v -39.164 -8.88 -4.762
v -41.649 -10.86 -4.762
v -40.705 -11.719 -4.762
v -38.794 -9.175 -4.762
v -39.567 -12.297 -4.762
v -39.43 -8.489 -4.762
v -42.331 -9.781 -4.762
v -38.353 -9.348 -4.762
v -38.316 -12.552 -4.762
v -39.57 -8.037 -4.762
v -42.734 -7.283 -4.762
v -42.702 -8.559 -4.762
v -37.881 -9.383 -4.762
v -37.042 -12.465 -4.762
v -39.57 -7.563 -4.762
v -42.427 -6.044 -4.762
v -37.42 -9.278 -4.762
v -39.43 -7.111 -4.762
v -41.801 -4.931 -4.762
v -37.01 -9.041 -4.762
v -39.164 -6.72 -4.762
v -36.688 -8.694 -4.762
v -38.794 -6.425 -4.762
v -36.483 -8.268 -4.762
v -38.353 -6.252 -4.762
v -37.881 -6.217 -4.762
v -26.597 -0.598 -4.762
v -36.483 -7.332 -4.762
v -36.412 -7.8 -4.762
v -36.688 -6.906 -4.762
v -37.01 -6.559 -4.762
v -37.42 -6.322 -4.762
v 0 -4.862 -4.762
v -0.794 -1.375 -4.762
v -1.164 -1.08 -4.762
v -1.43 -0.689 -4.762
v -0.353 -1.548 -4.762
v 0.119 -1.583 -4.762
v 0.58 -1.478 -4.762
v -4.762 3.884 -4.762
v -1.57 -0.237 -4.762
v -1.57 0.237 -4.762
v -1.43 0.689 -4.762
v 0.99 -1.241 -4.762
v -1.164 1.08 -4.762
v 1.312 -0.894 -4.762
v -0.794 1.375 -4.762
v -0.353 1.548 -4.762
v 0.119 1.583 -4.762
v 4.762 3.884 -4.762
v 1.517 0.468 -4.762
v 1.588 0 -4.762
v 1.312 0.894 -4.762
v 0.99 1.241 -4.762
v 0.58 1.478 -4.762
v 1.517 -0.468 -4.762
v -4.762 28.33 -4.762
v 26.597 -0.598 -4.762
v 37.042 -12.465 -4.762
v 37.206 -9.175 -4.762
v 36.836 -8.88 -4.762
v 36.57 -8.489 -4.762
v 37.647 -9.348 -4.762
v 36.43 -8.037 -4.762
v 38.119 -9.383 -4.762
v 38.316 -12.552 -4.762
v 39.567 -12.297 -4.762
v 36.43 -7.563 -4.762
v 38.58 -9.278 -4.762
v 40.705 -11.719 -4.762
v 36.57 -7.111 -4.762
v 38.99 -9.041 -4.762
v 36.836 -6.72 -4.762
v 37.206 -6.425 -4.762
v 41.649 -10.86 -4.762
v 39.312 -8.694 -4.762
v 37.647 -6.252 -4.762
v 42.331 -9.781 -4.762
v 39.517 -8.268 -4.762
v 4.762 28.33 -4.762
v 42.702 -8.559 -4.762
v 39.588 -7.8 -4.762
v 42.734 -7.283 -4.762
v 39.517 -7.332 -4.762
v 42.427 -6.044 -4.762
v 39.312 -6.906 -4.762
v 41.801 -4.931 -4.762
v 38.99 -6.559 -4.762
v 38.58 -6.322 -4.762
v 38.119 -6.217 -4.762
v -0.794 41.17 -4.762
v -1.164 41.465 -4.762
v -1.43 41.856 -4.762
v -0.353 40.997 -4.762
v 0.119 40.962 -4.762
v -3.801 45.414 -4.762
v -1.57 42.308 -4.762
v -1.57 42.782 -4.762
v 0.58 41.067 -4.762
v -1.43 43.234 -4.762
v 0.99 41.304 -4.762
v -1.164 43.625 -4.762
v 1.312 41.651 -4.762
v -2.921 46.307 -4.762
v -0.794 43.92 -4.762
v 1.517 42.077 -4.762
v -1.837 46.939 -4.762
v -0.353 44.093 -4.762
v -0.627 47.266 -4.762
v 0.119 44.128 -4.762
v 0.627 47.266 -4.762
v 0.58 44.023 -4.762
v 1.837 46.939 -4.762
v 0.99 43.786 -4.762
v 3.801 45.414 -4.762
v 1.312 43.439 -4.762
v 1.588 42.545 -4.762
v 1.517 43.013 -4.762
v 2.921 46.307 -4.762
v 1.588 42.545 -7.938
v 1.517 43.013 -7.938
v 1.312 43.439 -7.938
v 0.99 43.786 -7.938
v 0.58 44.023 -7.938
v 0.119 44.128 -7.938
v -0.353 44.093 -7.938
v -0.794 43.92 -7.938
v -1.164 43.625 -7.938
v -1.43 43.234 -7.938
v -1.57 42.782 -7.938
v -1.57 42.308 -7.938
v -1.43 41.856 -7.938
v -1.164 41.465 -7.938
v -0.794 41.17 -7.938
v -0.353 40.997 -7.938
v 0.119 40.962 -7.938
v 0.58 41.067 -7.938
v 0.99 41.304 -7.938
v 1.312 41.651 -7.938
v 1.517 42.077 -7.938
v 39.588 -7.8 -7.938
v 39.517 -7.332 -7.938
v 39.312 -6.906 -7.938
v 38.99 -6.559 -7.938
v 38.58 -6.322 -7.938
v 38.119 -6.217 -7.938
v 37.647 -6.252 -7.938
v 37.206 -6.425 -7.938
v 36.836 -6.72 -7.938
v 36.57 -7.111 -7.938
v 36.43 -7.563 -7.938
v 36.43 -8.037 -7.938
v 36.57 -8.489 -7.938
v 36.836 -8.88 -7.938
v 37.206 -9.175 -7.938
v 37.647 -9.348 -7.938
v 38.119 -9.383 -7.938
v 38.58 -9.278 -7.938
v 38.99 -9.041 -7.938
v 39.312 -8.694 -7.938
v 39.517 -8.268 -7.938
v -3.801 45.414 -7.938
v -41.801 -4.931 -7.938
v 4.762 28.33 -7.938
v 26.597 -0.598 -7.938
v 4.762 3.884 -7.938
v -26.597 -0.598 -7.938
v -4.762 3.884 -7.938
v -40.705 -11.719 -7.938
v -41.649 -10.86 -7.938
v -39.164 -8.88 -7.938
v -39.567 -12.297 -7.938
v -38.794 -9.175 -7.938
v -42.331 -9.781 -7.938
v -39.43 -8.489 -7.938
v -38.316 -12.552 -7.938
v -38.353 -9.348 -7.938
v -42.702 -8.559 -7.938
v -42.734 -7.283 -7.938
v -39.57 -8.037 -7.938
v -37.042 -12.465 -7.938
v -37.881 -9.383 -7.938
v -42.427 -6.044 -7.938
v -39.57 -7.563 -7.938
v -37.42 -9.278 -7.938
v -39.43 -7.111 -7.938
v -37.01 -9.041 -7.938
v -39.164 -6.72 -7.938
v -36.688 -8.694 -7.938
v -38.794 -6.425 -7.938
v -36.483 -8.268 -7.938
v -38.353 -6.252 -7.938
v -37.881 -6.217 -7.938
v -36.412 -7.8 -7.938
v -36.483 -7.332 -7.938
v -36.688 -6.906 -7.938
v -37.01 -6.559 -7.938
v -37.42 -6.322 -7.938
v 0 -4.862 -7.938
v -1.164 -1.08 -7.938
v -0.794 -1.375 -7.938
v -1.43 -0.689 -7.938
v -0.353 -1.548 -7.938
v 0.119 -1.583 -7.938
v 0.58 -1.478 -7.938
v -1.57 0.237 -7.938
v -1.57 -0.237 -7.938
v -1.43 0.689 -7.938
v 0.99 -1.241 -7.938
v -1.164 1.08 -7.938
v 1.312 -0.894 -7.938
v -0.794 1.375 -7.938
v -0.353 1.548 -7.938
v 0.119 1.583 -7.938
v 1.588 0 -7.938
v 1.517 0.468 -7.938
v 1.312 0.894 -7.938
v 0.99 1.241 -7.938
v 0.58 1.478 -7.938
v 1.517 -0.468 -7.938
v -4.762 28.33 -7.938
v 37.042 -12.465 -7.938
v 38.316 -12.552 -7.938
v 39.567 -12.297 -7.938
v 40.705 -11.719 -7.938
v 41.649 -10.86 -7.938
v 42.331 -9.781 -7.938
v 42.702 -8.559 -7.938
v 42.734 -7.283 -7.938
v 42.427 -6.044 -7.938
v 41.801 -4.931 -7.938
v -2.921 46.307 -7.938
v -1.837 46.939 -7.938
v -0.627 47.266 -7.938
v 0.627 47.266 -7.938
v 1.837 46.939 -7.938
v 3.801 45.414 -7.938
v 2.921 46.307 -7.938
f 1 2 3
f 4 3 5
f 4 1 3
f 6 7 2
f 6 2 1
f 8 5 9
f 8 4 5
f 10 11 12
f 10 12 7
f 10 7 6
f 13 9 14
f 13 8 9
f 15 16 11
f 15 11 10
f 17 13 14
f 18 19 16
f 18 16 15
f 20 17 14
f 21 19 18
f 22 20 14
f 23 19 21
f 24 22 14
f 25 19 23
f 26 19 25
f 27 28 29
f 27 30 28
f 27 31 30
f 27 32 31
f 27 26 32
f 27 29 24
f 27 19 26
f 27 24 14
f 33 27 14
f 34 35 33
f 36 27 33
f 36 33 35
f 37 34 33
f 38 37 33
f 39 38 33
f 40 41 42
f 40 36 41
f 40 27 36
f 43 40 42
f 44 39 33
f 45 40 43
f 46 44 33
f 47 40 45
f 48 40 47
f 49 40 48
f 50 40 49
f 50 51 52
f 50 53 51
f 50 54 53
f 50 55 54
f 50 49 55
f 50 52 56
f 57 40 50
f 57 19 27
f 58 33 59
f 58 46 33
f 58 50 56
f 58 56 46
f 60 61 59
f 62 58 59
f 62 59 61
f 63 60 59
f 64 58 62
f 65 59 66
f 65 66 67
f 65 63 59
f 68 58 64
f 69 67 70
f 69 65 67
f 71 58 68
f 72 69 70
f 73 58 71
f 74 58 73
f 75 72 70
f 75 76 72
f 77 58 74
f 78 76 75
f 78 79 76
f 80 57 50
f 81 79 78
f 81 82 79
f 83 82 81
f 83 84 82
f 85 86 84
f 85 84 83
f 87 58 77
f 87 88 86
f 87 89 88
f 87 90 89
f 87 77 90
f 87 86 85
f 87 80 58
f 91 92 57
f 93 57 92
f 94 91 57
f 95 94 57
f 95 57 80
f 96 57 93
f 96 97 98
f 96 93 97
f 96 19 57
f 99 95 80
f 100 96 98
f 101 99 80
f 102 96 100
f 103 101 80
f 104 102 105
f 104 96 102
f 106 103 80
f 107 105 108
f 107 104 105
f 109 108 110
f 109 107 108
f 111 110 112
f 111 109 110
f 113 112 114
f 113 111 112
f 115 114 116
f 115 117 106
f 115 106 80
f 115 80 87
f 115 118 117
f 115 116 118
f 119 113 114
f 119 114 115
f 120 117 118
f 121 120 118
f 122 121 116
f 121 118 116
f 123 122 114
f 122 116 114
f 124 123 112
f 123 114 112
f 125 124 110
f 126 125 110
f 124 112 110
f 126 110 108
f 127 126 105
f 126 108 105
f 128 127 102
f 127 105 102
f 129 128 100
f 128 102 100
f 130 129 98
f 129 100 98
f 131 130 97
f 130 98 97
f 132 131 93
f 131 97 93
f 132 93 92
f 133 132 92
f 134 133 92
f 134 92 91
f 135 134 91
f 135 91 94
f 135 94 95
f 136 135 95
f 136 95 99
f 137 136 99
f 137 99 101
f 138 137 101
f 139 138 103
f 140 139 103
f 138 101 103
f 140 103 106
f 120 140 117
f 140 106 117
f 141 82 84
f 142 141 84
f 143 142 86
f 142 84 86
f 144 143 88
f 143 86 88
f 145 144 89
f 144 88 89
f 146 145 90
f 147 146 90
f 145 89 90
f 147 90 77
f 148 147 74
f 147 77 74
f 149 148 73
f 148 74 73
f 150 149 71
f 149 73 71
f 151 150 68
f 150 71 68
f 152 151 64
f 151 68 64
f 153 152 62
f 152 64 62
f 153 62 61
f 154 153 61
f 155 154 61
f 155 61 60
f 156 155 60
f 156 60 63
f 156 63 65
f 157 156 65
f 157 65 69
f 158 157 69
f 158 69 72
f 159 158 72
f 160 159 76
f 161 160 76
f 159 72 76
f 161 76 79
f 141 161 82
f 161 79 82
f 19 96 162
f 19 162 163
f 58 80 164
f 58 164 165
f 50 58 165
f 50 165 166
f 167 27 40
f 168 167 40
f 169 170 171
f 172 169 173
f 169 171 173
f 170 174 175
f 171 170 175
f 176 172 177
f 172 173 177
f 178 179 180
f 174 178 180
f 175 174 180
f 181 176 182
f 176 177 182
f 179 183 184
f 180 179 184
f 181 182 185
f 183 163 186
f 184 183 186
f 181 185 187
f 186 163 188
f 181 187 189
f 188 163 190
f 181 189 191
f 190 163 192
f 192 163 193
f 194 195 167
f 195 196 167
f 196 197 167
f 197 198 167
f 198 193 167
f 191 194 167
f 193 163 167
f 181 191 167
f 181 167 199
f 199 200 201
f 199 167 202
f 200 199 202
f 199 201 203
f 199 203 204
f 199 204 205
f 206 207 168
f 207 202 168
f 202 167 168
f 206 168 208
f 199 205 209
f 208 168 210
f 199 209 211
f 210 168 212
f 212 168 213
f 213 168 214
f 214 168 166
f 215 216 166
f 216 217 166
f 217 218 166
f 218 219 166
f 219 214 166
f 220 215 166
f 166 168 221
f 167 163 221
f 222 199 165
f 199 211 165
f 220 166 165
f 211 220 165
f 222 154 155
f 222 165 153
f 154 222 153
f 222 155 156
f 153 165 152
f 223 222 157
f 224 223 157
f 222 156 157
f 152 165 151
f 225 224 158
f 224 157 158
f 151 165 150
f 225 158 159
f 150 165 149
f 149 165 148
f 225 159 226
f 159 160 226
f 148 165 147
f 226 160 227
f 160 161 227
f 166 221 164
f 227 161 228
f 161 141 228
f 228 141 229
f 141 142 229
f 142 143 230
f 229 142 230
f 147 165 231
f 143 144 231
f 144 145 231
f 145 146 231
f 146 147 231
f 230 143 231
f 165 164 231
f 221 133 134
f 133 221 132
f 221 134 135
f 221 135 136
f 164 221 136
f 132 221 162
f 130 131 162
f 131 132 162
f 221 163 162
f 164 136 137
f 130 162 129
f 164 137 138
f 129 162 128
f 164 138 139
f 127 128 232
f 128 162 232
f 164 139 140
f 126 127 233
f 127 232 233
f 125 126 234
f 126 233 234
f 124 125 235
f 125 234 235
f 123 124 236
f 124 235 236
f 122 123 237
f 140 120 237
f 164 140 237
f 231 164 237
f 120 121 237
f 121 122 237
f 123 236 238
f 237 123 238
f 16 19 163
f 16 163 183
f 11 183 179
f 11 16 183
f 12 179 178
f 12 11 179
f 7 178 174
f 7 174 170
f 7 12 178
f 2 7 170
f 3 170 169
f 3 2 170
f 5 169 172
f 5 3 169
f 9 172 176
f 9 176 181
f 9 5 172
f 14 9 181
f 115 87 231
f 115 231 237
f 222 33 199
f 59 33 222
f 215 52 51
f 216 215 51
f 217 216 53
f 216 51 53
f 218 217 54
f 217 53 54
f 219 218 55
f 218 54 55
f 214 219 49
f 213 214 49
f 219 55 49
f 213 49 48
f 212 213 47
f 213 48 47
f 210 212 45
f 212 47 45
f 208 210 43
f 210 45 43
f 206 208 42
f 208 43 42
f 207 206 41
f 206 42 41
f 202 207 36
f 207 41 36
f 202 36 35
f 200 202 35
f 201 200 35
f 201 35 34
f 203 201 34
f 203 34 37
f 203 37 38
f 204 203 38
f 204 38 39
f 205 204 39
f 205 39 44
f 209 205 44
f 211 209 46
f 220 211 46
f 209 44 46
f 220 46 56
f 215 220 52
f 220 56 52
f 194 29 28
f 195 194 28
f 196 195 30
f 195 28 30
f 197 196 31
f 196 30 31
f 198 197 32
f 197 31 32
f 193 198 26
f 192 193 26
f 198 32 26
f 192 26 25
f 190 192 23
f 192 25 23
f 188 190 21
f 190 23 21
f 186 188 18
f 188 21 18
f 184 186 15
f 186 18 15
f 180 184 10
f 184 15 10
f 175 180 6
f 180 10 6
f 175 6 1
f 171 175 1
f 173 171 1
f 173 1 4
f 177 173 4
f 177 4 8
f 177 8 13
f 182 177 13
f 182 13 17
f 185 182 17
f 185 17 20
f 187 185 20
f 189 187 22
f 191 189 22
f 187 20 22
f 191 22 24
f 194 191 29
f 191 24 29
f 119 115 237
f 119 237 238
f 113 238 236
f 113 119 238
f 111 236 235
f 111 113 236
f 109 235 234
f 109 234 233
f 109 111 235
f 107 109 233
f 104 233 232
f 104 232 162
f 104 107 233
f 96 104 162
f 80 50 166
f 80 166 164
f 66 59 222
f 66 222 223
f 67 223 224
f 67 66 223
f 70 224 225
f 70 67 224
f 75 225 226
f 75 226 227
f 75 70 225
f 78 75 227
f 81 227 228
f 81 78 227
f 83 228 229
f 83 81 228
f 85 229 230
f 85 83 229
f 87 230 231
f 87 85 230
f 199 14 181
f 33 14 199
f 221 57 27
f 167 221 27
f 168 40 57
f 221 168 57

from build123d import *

# Parameters (mm, degrees)
BOSS_EXTRUDE2_START = -4.7625
SKETCH1_R           = 1.5875
BOSS_EXTRUDE2_DEPTH = 3.175


with BuildPart() as part:
    # Sketch1 → Boss-Extrude2 (new body)
    with BuildSketch(Plane.XY.offset(BOSS_EXTRUDE2_START)):
        with BuildLine():
            Line((-37.042399359, -12.465233892), (0, -4.861794023))
            Line((0, -4.861794023), (37.042399359, -12.465233892))
            ThreePointArc((37.042399359, -12.465233892), (42.026572193, -10.343250405), (41.801238825, -4.93085559))
            Line((41.801238825, -4.93085559), (3.801238825, 45.41414441))
            ThreePointArc((3.801238825, 45.41414441), (0, 47.3075), (-3.801238825, 45.41414441))
            Line((-3.801238825, 45.41414441), (-41.801238825, -4.93085559))
            ThreePointArc((-41.801238825, -4.93085559), (-42.026572193, -10.343250405), (-37.042399359, -12.465233892))
        make_face()
        with Locations((38, -7.8)):
            Circle(SKETCH1_R, mode=Mode.SUBTRACT)
        Circle(SKETCH1_R, mode=Mode.SUBTRACT)
        with Locations((-38, -7.8)):
            Circle(SKETCH1_R, mode=Mode.SUBTRACT)
        with Locations((0, 42.545)):
            Circle(SKETCH1_R, mode=Mode.SUBTRACT)
        Polygon((-4.7625, 3.884228234), (-4.7625, 28.330028455), (-26.596802701, -0.597549689), align=None, mode=Mode.SUBTRACT)
        Polygon((4.7625, 3.884228234), (4.7625, 28.330028455), (26.596802701, -0.597549689), align=None, mode=Mode.SUBTRACT)
    extrude(amount=-BOSS_EXTRUDE2_DEPTH)


solid = part.part
